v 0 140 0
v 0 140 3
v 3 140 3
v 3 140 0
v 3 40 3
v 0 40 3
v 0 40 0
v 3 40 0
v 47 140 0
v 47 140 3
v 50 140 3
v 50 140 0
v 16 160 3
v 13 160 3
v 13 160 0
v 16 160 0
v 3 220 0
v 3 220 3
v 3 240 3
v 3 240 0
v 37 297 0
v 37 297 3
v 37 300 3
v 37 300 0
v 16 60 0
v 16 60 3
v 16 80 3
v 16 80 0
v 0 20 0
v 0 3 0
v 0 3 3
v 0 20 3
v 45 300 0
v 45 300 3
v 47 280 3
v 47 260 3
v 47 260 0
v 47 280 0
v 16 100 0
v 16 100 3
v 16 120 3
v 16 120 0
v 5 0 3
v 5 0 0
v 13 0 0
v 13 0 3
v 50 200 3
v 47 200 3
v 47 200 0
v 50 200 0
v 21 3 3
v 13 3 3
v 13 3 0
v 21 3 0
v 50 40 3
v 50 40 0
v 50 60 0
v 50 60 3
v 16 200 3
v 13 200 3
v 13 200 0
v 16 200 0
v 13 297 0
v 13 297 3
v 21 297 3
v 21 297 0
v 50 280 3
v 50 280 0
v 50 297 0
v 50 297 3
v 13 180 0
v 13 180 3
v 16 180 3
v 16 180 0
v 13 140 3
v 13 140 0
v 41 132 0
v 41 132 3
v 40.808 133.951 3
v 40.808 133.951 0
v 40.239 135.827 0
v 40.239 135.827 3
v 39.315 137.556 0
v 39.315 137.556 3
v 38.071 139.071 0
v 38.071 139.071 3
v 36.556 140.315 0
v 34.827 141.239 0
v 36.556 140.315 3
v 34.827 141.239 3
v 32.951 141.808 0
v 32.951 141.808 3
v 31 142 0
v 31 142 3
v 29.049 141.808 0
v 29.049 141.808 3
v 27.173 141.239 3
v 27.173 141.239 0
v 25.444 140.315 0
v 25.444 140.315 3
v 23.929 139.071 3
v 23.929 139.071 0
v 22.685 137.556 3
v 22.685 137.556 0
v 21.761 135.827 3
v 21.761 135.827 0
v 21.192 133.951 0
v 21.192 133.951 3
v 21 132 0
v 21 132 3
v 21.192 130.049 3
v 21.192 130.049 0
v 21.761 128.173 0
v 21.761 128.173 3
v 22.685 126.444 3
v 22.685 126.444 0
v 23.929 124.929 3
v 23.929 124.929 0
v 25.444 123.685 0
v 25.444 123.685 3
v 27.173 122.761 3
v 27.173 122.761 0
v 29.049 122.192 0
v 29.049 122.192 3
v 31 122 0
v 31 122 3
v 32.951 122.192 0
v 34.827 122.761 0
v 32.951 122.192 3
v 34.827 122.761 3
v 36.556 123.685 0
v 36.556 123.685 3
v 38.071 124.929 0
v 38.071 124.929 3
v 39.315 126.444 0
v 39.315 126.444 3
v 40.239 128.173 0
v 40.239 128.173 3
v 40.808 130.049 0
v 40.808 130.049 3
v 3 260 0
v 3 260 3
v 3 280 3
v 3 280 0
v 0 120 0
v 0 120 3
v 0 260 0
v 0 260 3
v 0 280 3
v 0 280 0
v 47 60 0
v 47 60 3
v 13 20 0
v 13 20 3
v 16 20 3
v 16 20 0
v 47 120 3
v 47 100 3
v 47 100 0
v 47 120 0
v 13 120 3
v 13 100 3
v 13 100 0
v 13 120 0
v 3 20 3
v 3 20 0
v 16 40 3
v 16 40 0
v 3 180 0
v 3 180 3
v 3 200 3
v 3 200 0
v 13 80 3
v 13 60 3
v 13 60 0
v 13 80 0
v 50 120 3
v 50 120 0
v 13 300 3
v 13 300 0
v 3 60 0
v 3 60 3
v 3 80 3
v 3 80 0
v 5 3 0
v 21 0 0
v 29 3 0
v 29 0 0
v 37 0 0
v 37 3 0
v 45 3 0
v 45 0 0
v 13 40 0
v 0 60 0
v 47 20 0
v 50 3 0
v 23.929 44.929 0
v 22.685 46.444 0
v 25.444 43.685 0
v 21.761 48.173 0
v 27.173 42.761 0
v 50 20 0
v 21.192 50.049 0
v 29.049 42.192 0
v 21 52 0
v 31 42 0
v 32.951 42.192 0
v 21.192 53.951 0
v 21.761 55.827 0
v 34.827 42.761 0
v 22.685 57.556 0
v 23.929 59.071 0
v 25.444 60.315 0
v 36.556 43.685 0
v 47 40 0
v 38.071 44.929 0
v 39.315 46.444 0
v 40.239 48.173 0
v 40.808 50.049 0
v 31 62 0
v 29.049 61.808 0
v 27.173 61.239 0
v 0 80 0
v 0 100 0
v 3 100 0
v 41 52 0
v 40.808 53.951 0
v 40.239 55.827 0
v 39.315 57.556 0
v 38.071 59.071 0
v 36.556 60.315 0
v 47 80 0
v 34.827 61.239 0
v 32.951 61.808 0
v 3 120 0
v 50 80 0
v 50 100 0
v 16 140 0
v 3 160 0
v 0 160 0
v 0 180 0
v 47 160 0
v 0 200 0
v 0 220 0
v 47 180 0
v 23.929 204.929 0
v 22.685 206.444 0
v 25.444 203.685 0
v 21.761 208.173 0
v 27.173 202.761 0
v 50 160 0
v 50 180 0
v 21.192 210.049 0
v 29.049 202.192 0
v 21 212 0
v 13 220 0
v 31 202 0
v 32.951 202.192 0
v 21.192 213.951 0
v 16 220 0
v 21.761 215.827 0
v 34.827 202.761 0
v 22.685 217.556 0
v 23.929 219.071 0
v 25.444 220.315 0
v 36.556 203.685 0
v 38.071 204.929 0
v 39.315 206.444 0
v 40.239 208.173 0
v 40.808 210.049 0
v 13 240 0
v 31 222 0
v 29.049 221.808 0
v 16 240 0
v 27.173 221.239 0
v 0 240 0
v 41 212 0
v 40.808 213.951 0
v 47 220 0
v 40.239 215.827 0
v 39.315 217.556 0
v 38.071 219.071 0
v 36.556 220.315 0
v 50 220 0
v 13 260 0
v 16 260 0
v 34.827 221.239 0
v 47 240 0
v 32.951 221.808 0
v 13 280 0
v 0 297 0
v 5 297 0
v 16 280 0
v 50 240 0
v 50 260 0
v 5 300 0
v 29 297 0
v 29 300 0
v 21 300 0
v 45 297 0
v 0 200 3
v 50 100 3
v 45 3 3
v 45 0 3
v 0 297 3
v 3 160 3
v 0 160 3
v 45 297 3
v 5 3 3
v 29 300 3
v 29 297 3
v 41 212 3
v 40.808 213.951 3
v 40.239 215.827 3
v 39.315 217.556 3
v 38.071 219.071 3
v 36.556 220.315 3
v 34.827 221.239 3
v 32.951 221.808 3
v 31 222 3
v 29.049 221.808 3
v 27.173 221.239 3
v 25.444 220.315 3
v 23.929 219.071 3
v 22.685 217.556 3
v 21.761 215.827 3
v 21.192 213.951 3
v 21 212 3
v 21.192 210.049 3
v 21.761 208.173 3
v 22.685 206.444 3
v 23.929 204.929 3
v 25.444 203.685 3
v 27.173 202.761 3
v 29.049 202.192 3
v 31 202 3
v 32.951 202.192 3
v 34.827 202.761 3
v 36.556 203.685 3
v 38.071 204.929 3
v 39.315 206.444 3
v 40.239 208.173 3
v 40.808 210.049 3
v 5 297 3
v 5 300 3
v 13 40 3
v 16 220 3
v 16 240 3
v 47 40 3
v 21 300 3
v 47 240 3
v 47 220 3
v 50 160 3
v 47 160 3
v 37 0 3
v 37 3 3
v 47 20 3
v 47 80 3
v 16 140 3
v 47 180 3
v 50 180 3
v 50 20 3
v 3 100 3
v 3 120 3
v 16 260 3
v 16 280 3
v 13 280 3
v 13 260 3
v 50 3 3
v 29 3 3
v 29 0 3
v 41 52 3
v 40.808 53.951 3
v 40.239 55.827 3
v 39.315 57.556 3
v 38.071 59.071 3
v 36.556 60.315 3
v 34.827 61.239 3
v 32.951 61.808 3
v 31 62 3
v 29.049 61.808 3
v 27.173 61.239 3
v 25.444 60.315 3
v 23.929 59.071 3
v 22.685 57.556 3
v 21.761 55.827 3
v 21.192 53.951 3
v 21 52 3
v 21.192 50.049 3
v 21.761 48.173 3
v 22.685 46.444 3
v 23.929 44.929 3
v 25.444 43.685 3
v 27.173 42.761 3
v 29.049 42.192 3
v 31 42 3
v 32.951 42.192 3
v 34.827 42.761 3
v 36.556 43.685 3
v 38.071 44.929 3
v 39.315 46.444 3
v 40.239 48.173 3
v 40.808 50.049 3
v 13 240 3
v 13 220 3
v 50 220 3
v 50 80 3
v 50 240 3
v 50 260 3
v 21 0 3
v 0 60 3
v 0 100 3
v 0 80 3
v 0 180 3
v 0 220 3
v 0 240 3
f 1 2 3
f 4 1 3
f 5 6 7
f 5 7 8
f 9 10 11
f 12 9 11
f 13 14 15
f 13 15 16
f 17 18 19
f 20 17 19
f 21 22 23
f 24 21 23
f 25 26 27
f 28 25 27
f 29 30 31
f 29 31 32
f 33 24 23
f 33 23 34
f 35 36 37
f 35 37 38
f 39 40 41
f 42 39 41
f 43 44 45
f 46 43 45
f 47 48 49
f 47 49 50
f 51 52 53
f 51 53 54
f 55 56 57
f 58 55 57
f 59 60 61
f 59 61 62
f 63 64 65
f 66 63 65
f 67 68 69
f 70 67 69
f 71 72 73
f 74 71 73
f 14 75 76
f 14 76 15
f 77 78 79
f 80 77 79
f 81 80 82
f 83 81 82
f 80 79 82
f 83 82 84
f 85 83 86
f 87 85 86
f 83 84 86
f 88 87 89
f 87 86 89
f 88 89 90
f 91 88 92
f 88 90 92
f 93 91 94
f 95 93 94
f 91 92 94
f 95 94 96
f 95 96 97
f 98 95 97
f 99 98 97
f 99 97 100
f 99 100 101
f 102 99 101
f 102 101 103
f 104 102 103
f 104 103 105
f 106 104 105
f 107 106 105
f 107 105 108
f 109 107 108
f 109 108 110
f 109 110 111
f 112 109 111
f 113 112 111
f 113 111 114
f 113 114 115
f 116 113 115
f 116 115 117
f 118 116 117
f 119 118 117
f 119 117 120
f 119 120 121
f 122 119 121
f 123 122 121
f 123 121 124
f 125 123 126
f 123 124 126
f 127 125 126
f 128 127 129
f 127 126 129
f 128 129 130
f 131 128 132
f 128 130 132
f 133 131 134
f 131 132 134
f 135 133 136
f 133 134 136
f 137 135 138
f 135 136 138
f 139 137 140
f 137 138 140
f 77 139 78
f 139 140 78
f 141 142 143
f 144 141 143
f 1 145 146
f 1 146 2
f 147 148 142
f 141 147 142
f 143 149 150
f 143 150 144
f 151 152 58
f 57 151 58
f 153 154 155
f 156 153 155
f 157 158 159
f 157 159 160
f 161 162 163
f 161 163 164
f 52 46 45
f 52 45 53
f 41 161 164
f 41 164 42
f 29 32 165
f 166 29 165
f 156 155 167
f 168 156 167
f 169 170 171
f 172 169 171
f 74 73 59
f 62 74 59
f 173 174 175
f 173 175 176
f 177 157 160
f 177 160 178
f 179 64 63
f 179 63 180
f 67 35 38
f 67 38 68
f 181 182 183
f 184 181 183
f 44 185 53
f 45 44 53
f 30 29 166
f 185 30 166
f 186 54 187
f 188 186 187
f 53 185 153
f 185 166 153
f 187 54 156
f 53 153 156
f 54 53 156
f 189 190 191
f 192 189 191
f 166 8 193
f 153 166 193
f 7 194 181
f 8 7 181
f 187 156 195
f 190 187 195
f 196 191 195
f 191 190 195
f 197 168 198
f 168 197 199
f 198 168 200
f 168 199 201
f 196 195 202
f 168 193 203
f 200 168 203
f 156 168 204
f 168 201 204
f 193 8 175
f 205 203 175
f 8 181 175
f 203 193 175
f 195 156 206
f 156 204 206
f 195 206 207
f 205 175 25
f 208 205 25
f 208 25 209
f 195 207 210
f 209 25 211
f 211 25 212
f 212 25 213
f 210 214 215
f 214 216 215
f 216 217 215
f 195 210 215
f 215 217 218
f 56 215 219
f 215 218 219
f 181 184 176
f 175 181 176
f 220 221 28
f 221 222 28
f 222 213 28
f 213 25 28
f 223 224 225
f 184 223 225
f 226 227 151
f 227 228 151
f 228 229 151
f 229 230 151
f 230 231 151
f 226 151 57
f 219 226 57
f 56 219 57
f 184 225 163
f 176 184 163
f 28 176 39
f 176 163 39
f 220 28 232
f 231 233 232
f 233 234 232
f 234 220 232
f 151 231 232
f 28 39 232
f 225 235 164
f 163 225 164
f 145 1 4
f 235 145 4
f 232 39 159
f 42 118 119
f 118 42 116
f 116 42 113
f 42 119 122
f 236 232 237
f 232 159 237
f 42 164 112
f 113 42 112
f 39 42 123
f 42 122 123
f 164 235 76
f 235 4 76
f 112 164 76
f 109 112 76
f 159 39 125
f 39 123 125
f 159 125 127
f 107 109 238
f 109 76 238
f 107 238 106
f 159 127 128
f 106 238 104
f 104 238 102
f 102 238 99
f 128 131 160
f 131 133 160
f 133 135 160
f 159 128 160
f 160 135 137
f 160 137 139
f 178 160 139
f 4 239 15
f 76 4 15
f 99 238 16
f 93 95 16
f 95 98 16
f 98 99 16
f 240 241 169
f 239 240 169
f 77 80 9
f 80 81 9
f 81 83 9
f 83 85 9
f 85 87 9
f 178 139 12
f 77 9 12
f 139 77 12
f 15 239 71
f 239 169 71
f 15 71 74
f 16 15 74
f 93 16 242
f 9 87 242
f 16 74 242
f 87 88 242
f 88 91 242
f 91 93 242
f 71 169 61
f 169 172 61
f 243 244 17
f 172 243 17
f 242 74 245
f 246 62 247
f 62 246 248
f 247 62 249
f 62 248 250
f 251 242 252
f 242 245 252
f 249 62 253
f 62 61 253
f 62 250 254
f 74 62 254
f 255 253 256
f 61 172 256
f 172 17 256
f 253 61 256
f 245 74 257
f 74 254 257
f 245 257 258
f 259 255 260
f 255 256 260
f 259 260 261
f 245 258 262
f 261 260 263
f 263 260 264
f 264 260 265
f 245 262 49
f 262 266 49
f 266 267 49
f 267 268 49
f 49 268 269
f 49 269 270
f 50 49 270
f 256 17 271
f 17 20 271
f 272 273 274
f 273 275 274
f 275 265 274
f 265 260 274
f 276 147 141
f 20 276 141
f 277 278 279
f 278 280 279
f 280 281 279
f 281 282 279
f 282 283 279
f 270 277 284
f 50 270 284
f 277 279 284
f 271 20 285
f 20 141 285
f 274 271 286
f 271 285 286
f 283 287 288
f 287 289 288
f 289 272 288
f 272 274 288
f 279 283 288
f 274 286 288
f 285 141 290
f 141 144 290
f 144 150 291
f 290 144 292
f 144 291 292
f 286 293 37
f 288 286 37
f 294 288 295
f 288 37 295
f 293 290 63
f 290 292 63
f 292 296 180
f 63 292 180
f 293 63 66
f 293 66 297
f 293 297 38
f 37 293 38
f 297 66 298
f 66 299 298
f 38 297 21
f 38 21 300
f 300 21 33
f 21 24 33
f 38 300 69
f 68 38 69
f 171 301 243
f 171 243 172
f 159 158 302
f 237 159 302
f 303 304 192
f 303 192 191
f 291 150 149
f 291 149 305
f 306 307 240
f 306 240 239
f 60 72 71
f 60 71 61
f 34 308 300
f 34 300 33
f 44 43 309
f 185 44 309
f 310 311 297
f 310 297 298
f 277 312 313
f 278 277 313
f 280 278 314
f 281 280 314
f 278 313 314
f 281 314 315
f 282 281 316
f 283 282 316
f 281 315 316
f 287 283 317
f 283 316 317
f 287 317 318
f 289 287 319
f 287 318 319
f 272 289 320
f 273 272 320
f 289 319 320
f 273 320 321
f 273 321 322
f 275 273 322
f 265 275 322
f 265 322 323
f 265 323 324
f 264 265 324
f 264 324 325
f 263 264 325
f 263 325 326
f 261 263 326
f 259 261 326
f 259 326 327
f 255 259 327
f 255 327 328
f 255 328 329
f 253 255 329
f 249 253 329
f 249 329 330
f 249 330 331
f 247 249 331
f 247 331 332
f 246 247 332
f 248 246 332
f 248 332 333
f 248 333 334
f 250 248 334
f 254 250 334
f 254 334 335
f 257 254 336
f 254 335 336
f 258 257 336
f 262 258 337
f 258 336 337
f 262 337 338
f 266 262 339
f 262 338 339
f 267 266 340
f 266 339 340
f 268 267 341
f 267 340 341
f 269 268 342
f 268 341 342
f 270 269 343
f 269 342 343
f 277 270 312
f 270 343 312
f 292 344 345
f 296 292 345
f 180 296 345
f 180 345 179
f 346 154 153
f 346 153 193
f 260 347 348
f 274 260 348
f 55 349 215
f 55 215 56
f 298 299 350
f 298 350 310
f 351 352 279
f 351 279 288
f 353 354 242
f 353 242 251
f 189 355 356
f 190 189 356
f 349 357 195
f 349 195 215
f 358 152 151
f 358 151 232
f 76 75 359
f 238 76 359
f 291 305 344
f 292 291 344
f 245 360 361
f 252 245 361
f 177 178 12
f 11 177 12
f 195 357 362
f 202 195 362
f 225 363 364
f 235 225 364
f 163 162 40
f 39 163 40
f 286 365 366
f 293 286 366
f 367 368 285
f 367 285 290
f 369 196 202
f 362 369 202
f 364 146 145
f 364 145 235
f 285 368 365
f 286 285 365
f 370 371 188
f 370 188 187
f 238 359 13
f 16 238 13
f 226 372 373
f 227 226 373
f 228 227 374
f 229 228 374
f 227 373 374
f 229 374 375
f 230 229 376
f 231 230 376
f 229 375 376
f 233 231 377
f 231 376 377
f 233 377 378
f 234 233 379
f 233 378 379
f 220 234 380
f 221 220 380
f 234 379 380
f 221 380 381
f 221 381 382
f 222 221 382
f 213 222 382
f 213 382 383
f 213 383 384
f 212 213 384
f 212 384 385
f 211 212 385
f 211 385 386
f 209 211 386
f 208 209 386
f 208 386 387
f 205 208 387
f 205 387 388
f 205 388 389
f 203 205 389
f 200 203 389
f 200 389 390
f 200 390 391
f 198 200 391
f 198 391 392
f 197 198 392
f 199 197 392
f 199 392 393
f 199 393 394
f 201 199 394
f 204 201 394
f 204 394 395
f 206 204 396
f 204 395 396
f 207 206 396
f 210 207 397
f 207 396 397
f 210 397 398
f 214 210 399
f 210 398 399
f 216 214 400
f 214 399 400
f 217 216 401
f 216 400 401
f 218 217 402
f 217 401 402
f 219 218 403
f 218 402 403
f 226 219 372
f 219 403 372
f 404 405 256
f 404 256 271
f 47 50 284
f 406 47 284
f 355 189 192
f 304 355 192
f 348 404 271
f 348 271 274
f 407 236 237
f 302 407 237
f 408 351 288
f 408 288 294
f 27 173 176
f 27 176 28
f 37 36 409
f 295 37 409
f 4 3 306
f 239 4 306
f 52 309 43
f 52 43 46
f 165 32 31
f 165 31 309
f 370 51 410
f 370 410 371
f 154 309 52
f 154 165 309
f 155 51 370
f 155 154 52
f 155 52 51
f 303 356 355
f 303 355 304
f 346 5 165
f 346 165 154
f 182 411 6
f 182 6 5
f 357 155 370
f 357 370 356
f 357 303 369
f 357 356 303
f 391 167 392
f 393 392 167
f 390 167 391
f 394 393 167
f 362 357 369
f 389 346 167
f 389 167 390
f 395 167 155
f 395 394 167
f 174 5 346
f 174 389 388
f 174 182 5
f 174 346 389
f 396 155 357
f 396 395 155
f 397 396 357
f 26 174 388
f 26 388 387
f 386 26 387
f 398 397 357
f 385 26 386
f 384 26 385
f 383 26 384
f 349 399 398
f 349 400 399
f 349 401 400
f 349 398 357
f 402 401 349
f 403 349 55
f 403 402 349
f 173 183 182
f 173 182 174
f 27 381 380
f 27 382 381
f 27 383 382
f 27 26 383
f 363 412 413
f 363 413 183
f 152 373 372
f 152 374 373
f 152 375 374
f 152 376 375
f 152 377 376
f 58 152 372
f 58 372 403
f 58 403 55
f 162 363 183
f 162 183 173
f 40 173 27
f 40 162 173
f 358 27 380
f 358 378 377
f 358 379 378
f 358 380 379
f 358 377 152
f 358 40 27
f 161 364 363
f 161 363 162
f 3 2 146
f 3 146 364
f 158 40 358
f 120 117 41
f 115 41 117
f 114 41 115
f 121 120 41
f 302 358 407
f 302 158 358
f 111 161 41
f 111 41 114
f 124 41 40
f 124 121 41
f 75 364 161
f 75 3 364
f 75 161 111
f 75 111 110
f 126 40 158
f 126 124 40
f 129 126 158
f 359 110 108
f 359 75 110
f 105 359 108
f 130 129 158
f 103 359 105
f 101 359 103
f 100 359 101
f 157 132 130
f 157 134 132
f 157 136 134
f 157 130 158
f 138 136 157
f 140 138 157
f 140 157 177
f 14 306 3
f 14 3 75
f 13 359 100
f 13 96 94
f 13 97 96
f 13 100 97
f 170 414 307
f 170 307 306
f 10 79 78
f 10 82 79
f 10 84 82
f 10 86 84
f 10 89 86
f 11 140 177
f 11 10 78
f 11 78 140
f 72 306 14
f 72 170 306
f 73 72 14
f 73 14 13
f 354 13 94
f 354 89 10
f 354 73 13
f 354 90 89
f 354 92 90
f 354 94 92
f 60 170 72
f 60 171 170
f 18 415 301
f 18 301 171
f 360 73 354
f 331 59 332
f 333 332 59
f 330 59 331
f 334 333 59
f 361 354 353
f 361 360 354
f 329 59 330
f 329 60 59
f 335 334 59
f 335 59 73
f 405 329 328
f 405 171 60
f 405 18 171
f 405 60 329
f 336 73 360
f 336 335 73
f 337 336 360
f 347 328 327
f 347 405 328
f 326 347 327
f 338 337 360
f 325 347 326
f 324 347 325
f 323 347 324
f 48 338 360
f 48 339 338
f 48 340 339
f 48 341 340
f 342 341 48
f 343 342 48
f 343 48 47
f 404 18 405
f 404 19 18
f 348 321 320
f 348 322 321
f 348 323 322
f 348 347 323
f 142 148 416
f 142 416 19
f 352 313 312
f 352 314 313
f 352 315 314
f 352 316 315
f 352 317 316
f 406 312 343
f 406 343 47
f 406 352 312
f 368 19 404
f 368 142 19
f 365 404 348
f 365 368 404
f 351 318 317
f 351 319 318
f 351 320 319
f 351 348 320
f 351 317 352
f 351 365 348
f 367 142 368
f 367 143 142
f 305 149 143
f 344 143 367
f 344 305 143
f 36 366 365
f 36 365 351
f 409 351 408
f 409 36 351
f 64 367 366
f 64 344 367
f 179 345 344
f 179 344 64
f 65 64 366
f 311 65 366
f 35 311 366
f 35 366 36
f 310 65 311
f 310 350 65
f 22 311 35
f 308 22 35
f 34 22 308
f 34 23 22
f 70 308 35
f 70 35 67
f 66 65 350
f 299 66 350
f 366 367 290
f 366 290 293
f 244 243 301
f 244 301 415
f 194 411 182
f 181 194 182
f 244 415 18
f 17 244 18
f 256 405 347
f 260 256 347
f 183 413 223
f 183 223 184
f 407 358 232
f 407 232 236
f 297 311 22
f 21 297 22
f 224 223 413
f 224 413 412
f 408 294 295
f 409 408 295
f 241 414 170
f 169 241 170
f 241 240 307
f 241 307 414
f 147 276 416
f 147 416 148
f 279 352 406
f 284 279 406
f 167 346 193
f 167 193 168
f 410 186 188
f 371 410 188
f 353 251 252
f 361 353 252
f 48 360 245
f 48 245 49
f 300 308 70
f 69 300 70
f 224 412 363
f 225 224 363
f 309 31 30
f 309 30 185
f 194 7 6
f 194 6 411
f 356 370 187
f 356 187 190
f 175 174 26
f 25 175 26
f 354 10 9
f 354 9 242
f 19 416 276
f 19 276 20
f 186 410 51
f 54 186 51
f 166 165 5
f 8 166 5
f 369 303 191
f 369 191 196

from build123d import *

# Parameters (mm, degrees)
SKETCH_W      = 50
SKETCH_H      = 300
PAD_DEPTH     = 3
SKETCH001_R   = 10
SKETCH001_W   = 3
SKETCH001_H   = 20
SKETCH001_W_2 = 8
SKETCH001_H_2 = 3
POCKET_DEPTH  = 3.001


with BuildPart() as part:
    # Sketch → Pad (new body)
    with BuildSketch(Plane.XY):
        with Locations((25, 150)):
            Rectangle(SKETCH_W, SKETCH_H)
    extrude(amount=PAD_DEPTH)

    # Sketch001 (on Face6 of Pad) → Pocket (cut, through all)
    with BuildSketch(Plane.XY.offset(3)):
        with Locations((31, 52)):
            Circle(SKETCH001_R)
        with Locations((31, 132)):
            Circle(SKETCH001_R)
        with Locations((31, 212)):
            Circle(SKETCH001_R)
        with Locations((1.5, 30)):
            Rectangle(SKETCH001_W, SKETCH001_H)
        with Locations((1.5, 70)):
            Rectangle(SKETCH001_W, SKETCH001_H)
        with Locations((1.5, 110)):
            Rectangle(SKETCH001_W, SKETCH001_H)
        with Locations((1.5, 150)):
            Rectangle(SKETCH001_W, SKETCH001_H)
        with Locations((1.5, 190)):
            Rectangle(SKETCH001_W, SKETCH001_H)
        with Locations((1.5, 230)):
            Rectangle(SKETCH001_W, SKETCH001_H)
        with Locations((1.5, 270)):
            Rectangle(SKETCH001_W, SKETCH001_H)
        with Locations((14.5, 30)):
            Rectangle(SKETCH001_W, SKETCH001_H)
        with Locations((14.5, 70)):
            Rectangle(SKETCH001_W, SKETCH001_H)
        with Locations((14.5, 110)):
            Rectangle(SKETCH001_W, SKETCH001_H)
        with Locations((14.5, 150)):
            Rectangle(SKETCH001_W, SKETCH001_H)
        with Locations((14.5, 190)):
            Rectangle(SKETCH001_W, SKETCH001_H)
        with Locations((14.5, 230)):
            Rectangle(SKETCH001_W, SKETCH001_H)
        with Locations((14.5, 270)):
            Rectangle(SKETCH001_W, SKETCH001_H)
        with Locations((48.5, 30)):
            Rectangle(SKETCH001_W, SKETCH001_H)
        with Locations((48.5, 70)):
            Rectangle(SKETCH001_W, SKETCH001_H)
        with Locations((48.5, 110)):
            Rectangle(SKETCH001_W, SKETCH001_H)
        with Locations((48.5, 150)):
            Rectangle(SKETCH001_W, SKETCH001_H)
        with Locations((48.5, 190)):
            Rectangle(SKETCH001_W, SKETCH001_H)
        with Locations((48.5, 230)):
            Rectangle(SKETCH001_W, SKETCH001_H)
        with Locations((48.5, 270)):
            Rectangle(SKETCH001_W, SKETCH001_H)
        with Locations((1, 1.5)):
            Rectangle(SKETCH001_W_2, SKETCH001_H_2)
        with Locations((17, 1.5)):
            Rectangle(SKETCH001_W_2, SKETCH001_H_2)
        with Locations((33, 1.5)):
            Rectangle(SKETCH001_W_2, SKETCH001_H_2)
        with Locations((49, 1.5)):
            Rectangle(SKETCH001_W_2, SKETCH001_H_2)
        with Locations((1, 298.5)):
            Rectangle(SKETCH001_W_2, SKETCH001_H_2)
        with Locations((17, 298.5)):
            Rectangle(SKETCH001_W_2, SKETCH001_H_2)
        with Locations((33, 298.5)):
            Rectangle(SKETCH001_W_2, SKETCH001_H_2)
        with Locations((49, 298.5)):
            Rectangle(SKETCH001_W_2, SKETCH001_H_2)
    extrude(amount=-POCKET_DEPTH, mode=Mode.SUBTRACT)


solid = part.part
